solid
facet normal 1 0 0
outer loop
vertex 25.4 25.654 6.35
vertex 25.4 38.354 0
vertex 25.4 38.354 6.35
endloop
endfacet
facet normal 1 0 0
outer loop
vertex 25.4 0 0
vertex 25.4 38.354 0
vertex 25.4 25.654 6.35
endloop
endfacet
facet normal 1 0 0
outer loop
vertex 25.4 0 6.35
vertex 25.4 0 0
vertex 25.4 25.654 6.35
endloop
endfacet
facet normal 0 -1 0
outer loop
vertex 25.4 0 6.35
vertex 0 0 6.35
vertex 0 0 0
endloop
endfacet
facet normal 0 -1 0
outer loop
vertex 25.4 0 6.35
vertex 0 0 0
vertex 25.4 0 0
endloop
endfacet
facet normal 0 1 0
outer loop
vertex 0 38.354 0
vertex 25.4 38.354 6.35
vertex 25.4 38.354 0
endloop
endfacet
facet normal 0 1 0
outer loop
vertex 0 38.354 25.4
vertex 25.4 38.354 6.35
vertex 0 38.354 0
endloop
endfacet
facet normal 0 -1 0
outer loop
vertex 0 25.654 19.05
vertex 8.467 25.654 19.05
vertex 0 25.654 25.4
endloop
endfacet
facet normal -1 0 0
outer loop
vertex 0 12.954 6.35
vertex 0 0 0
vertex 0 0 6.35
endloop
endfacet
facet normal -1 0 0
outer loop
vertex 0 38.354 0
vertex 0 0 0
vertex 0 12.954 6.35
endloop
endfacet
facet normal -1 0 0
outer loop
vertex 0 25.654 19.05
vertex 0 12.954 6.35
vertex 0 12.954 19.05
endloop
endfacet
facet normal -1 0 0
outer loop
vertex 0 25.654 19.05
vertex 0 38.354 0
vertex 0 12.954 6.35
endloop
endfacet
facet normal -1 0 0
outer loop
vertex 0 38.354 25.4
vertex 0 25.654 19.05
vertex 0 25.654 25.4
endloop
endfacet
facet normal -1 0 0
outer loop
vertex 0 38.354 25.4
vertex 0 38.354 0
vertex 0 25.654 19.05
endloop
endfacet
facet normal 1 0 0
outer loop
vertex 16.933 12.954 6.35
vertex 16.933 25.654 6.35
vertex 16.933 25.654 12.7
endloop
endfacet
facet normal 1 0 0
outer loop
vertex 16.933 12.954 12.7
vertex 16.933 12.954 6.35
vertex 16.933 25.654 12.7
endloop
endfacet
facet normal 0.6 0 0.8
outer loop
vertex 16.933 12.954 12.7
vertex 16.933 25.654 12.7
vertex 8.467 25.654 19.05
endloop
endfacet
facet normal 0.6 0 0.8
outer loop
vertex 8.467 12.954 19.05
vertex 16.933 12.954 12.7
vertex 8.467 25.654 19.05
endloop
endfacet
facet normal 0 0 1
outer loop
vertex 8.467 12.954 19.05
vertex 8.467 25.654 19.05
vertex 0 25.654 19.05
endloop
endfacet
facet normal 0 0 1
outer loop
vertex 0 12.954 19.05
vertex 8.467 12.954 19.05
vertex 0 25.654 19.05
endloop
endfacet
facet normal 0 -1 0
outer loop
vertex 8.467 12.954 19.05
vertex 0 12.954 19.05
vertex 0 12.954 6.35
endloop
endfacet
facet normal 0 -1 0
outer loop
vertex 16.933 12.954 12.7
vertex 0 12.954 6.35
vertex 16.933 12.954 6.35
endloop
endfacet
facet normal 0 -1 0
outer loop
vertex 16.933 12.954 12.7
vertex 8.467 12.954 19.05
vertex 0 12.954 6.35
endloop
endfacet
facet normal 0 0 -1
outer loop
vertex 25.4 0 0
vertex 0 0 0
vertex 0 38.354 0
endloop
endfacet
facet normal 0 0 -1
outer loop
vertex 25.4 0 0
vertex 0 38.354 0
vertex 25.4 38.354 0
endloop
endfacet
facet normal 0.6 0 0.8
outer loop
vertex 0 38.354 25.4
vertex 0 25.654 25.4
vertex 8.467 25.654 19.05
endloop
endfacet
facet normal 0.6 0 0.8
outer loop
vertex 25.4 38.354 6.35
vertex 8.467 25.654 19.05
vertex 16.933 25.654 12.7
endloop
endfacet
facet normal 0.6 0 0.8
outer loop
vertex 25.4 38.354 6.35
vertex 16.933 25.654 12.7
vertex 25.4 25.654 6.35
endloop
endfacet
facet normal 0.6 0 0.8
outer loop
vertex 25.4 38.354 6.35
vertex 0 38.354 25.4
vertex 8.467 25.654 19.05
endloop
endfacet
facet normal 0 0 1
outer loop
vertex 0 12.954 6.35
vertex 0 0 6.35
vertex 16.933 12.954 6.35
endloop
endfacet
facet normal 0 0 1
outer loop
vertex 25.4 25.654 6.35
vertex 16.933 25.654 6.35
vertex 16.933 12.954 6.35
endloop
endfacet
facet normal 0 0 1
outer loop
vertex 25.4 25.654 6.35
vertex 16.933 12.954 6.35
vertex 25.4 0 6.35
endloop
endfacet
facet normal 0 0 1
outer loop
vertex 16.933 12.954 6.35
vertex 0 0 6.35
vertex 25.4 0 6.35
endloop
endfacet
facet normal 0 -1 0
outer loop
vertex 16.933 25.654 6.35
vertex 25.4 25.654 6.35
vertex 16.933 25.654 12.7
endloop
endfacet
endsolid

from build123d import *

# Parameters (mm, degrees)
F0_W     = 25.4
F0_H     = 6.35
F1_DEPTH = 38.354
F3_DEPTH = 12.7
F5_DEPTH = 12.7
F6_DEPTH = 12.7


with BuildPart() as f1:
    # F0 (on Front) → F1 (new body)
    with BuildSketch(Plane.XZ):
        with Locations((12.7, 3.175)):
            Rectangle(F0_W, F0_H)
    extrude(amount=-F1_DEPTH)

    # F2 (on face) → F3 (join)
    with BuildSketch(Plane(origin=(0, 38.354, 0), x_dir=(-1, 0, 0), z_dir=(0, 1, 0))):
        Polygon((-25.4, 6.35), (0, 6.35), (0, 25.4), align=None)
    extrude(amount=-F3_DEPTH)

    # F4 (on face) → F5 (join)
    with BuildSketch(Plane.XZ.offset(-25.654)):
        Polygon((0, 6.35), (16.9333333333, 6.35), (16.9333333333, 12.7), (8.4666666667, 19.05), (0, 19.05), align=None)
    extrude(amount=F5_DEPTH)

    # F4 (on face) → F6 (join)
    with BuildSketch(Plane.XZ.offset(-25.654)):
        Polygon((0, 6.35), (16.9333333333, 6.35), (16.9333333333, 12.7), (8.4666666667, 19.05), (0, 19.05), align=None)
    extrude(amount=F6_DEPTH)


solid = f1.part
